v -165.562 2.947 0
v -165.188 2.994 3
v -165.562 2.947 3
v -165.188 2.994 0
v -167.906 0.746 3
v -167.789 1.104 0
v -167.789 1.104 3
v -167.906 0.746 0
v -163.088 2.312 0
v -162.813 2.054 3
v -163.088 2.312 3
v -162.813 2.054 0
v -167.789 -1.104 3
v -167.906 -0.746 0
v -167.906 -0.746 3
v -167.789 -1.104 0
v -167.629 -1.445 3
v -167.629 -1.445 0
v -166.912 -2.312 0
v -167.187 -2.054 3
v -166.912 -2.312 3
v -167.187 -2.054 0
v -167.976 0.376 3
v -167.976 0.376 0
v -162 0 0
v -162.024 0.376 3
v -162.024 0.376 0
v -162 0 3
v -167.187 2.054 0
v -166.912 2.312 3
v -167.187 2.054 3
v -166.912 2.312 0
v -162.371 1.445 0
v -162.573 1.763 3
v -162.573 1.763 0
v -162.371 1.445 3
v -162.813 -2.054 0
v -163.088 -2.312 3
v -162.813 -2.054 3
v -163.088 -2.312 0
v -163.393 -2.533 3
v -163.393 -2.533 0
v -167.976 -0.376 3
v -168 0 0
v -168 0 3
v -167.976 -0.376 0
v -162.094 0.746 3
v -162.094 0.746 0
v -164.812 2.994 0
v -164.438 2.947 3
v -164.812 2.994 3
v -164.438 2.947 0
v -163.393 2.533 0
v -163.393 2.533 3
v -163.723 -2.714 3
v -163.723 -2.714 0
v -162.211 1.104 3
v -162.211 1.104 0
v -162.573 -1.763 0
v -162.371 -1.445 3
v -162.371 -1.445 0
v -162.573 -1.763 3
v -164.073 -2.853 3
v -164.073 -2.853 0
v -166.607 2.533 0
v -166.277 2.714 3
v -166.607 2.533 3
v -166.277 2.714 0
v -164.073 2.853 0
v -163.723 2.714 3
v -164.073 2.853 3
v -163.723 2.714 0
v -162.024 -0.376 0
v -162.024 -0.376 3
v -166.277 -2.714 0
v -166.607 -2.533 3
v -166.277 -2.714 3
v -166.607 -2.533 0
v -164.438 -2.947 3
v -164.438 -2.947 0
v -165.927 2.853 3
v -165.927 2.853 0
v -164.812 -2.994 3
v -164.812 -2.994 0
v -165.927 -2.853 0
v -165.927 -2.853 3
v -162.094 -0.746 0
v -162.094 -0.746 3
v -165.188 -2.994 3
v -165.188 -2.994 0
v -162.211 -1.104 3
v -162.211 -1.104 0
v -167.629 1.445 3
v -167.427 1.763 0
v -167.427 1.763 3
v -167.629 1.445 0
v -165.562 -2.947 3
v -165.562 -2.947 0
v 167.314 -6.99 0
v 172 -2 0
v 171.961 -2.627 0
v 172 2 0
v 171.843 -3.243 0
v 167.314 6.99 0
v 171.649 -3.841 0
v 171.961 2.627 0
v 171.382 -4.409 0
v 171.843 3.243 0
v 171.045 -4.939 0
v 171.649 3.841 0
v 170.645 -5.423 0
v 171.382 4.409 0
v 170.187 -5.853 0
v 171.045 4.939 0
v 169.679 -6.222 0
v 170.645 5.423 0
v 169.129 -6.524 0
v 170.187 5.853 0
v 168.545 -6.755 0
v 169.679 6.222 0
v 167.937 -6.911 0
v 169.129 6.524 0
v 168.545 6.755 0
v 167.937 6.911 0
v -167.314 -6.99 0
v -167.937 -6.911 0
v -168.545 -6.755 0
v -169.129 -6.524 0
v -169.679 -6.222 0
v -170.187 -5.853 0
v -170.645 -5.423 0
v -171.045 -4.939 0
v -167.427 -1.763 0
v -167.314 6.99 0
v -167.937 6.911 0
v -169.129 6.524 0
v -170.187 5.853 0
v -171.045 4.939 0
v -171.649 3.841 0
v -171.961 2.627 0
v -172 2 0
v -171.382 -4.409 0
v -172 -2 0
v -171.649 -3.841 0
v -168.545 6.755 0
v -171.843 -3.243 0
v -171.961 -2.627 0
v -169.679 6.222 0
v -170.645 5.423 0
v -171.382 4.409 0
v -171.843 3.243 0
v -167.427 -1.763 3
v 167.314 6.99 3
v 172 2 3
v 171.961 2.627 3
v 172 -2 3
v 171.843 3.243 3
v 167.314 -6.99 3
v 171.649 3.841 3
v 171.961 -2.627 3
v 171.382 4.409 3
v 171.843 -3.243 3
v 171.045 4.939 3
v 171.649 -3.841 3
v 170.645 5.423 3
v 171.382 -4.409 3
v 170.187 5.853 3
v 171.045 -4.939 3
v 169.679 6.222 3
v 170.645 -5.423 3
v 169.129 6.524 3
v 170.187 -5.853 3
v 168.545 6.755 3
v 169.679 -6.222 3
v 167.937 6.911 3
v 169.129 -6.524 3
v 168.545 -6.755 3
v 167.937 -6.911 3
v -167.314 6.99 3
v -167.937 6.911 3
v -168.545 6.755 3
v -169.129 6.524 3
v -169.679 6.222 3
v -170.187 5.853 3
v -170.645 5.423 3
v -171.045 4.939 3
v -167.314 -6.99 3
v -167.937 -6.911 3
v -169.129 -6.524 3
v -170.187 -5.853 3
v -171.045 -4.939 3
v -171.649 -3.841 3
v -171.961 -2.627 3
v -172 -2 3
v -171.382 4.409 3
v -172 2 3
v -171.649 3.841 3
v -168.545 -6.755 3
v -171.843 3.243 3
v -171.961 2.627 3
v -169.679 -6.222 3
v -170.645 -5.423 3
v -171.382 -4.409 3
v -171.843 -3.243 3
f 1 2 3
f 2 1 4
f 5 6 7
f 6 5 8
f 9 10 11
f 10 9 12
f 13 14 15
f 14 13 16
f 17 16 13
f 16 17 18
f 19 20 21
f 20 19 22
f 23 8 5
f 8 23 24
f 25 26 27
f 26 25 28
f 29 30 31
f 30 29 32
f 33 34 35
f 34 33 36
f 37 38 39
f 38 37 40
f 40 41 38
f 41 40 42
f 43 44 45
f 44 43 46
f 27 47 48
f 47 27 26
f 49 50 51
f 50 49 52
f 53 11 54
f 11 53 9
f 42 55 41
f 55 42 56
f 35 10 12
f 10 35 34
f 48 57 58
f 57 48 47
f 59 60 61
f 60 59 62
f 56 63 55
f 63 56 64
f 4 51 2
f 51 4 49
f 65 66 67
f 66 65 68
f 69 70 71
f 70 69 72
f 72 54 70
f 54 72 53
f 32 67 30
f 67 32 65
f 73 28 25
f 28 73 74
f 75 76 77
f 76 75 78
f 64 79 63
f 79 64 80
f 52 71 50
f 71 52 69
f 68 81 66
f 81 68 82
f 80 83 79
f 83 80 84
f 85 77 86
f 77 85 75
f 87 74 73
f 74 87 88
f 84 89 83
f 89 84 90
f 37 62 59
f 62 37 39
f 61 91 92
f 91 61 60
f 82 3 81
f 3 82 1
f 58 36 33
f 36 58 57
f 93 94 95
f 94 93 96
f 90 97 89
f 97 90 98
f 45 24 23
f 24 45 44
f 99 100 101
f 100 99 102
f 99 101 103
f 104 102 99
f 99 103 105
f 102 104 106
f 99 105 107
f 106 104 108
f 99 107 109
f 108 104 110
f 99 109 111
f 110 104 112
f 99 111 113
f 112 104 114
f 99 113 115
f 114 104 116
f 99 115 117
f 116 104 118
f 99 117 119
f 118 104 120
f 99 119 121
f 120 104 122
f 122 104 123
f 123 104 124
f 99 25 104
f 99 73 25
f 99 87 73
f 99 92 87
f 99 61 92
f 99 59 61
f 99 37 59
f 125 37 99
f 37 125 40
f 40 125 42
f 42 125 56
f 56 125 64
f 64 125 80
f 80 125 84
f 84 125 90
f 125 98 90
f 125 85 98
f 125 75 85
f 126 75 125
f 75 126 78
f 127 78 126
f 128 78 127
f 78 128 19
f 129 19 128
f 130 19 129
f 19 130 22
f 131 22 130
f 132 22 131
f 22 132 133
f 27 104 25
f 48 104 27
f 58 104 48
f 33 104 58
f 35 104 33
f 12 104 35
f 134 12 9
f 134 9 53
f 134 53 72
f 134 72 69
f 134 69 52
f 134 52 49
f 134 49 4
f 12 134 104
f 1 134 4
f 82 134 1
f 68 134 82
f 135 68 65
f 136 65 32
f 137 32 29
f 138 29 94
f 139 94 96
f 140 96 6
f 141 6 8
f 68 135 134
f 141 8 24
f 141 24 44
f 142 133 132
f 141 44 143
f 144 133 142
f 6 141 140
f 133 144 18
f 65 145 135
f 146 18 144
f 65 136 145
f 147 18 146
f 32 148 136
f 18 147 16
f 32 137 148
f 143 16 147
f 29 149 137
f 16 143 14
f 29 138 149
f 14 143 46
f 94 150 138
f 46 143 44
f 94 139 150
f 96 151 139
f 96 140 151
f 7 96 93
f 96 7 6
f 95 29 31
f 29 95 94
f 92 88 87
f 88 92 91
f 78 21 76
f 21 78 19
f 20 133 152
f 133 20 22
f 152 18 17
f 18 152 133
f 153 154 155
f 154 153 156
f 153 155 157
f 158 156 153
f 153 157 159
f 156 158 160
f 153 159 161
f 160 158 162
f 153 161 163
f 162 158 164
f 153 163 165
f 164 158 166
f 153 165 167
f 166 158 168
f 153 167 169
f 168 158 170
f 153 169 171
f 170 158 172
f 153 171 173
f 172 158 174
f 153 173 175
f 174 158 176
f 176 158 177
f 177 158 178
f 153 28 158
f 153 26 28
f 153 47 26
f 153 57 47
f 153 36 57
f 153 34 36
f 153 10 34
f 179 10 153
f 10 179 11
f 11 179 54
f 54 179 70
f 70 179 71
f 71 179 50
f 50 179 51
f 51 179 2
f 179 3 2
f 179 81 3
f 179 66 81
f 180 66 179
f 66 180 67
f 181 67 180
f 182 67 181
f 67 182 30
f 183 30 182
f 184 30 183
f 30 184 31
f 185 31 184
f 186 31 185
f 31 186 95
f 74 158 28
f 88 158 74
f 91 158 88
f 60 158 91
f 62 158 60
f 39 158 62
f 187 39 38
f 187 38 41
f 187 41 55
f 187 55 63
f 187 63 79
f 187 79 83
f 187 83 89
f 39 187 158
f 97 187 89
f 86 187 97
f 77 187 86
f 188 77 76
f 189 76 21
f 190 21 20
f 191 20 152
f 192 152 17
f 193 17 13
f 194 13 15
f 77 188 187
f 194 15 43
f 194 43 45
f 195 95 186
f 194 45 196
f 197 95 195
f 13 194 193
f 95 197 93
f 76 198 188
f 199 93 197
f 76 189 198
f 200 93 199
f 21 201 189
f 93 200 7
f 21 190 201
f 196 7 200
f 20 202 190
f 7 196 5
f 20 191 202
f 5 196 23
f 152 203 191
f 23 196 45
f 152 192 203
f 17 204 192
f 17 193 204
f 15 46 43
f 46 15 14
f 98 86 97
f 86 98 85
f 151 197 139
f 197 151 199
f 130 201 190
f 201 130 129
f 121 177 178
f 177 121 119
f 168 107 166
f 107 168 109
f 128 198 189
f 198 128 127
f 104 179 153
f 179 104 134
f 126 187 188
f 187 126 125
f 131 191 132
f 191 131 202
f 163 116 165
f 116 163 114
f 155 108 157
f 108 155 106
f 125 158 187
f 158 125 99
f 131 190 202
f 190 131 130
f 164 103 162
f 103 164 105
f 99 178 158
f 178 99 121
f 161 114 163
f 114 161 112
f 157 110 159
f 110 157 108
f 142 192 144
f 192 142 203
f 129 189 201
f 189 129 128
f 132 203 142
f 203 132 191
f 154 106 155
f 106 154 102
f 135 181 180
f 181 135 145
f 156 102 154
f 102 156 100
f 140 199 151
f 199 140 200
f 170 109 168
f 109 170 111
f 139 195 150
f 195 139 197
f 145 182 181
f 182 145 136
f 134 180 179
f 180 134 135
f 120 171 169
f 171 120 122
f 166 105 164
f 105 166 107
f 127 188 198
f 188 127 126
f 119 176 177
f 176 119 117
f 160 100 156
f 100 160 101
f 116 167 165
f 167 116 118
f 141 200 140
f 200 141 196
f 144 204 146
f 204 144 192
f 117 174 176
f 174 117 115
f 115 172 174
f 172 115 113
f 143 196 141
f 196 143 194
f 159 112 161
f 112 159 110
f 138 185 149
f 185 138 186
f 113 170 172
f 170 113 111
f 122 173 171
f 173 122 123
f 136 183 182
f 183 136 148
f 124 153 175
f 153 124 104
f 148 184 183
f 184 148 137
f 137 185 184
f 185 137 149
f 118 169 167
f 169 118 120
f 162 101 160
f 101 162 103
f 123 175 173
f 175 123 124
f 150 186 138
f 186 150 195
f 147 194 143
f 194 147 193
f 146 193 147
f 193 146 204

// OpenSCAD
$fn = 50;


difference() {
	union() {
		hull() {
			translate(v = [-167.0000000000, 2.0000000000, 0]) {
				cylinder(h = 3, r = 5);
			}
			translate(v = [167.0000000000, 2.0000000000, 0]) {
				cylinder(h = 3, r = 5);
			}
			translate(v = [-167.0000000000, -2.0000000000, 0]) {
				cylinder(h = 3, r = 5);
			}
			translate(v = [167.0000000000, -2.0000000000, 0]) {
				cylinder(h = 3, r = 5);
			}
		}
	}
	union() {
		translate(v = [-165.0000000000, 0.0000000000, 0]) {
			cylinder(h = 3, r = 3.0000000000);
		}
		translate(v = [-165.0000000000, 0.0000000000, 0]) {
			cylinder(h = 3, r = 1.5000000000);
		}
		translate(v = [-165.0000000000, 0.0000000000, 0]) {
			cylinder(h = 3, r = 1.5000000000);
		}
		translate(v = [-165.0000000000, 0.0000000000, 0]) {
			cylinder(h = 3, r = 1.5000000000);
		}
	}
}
